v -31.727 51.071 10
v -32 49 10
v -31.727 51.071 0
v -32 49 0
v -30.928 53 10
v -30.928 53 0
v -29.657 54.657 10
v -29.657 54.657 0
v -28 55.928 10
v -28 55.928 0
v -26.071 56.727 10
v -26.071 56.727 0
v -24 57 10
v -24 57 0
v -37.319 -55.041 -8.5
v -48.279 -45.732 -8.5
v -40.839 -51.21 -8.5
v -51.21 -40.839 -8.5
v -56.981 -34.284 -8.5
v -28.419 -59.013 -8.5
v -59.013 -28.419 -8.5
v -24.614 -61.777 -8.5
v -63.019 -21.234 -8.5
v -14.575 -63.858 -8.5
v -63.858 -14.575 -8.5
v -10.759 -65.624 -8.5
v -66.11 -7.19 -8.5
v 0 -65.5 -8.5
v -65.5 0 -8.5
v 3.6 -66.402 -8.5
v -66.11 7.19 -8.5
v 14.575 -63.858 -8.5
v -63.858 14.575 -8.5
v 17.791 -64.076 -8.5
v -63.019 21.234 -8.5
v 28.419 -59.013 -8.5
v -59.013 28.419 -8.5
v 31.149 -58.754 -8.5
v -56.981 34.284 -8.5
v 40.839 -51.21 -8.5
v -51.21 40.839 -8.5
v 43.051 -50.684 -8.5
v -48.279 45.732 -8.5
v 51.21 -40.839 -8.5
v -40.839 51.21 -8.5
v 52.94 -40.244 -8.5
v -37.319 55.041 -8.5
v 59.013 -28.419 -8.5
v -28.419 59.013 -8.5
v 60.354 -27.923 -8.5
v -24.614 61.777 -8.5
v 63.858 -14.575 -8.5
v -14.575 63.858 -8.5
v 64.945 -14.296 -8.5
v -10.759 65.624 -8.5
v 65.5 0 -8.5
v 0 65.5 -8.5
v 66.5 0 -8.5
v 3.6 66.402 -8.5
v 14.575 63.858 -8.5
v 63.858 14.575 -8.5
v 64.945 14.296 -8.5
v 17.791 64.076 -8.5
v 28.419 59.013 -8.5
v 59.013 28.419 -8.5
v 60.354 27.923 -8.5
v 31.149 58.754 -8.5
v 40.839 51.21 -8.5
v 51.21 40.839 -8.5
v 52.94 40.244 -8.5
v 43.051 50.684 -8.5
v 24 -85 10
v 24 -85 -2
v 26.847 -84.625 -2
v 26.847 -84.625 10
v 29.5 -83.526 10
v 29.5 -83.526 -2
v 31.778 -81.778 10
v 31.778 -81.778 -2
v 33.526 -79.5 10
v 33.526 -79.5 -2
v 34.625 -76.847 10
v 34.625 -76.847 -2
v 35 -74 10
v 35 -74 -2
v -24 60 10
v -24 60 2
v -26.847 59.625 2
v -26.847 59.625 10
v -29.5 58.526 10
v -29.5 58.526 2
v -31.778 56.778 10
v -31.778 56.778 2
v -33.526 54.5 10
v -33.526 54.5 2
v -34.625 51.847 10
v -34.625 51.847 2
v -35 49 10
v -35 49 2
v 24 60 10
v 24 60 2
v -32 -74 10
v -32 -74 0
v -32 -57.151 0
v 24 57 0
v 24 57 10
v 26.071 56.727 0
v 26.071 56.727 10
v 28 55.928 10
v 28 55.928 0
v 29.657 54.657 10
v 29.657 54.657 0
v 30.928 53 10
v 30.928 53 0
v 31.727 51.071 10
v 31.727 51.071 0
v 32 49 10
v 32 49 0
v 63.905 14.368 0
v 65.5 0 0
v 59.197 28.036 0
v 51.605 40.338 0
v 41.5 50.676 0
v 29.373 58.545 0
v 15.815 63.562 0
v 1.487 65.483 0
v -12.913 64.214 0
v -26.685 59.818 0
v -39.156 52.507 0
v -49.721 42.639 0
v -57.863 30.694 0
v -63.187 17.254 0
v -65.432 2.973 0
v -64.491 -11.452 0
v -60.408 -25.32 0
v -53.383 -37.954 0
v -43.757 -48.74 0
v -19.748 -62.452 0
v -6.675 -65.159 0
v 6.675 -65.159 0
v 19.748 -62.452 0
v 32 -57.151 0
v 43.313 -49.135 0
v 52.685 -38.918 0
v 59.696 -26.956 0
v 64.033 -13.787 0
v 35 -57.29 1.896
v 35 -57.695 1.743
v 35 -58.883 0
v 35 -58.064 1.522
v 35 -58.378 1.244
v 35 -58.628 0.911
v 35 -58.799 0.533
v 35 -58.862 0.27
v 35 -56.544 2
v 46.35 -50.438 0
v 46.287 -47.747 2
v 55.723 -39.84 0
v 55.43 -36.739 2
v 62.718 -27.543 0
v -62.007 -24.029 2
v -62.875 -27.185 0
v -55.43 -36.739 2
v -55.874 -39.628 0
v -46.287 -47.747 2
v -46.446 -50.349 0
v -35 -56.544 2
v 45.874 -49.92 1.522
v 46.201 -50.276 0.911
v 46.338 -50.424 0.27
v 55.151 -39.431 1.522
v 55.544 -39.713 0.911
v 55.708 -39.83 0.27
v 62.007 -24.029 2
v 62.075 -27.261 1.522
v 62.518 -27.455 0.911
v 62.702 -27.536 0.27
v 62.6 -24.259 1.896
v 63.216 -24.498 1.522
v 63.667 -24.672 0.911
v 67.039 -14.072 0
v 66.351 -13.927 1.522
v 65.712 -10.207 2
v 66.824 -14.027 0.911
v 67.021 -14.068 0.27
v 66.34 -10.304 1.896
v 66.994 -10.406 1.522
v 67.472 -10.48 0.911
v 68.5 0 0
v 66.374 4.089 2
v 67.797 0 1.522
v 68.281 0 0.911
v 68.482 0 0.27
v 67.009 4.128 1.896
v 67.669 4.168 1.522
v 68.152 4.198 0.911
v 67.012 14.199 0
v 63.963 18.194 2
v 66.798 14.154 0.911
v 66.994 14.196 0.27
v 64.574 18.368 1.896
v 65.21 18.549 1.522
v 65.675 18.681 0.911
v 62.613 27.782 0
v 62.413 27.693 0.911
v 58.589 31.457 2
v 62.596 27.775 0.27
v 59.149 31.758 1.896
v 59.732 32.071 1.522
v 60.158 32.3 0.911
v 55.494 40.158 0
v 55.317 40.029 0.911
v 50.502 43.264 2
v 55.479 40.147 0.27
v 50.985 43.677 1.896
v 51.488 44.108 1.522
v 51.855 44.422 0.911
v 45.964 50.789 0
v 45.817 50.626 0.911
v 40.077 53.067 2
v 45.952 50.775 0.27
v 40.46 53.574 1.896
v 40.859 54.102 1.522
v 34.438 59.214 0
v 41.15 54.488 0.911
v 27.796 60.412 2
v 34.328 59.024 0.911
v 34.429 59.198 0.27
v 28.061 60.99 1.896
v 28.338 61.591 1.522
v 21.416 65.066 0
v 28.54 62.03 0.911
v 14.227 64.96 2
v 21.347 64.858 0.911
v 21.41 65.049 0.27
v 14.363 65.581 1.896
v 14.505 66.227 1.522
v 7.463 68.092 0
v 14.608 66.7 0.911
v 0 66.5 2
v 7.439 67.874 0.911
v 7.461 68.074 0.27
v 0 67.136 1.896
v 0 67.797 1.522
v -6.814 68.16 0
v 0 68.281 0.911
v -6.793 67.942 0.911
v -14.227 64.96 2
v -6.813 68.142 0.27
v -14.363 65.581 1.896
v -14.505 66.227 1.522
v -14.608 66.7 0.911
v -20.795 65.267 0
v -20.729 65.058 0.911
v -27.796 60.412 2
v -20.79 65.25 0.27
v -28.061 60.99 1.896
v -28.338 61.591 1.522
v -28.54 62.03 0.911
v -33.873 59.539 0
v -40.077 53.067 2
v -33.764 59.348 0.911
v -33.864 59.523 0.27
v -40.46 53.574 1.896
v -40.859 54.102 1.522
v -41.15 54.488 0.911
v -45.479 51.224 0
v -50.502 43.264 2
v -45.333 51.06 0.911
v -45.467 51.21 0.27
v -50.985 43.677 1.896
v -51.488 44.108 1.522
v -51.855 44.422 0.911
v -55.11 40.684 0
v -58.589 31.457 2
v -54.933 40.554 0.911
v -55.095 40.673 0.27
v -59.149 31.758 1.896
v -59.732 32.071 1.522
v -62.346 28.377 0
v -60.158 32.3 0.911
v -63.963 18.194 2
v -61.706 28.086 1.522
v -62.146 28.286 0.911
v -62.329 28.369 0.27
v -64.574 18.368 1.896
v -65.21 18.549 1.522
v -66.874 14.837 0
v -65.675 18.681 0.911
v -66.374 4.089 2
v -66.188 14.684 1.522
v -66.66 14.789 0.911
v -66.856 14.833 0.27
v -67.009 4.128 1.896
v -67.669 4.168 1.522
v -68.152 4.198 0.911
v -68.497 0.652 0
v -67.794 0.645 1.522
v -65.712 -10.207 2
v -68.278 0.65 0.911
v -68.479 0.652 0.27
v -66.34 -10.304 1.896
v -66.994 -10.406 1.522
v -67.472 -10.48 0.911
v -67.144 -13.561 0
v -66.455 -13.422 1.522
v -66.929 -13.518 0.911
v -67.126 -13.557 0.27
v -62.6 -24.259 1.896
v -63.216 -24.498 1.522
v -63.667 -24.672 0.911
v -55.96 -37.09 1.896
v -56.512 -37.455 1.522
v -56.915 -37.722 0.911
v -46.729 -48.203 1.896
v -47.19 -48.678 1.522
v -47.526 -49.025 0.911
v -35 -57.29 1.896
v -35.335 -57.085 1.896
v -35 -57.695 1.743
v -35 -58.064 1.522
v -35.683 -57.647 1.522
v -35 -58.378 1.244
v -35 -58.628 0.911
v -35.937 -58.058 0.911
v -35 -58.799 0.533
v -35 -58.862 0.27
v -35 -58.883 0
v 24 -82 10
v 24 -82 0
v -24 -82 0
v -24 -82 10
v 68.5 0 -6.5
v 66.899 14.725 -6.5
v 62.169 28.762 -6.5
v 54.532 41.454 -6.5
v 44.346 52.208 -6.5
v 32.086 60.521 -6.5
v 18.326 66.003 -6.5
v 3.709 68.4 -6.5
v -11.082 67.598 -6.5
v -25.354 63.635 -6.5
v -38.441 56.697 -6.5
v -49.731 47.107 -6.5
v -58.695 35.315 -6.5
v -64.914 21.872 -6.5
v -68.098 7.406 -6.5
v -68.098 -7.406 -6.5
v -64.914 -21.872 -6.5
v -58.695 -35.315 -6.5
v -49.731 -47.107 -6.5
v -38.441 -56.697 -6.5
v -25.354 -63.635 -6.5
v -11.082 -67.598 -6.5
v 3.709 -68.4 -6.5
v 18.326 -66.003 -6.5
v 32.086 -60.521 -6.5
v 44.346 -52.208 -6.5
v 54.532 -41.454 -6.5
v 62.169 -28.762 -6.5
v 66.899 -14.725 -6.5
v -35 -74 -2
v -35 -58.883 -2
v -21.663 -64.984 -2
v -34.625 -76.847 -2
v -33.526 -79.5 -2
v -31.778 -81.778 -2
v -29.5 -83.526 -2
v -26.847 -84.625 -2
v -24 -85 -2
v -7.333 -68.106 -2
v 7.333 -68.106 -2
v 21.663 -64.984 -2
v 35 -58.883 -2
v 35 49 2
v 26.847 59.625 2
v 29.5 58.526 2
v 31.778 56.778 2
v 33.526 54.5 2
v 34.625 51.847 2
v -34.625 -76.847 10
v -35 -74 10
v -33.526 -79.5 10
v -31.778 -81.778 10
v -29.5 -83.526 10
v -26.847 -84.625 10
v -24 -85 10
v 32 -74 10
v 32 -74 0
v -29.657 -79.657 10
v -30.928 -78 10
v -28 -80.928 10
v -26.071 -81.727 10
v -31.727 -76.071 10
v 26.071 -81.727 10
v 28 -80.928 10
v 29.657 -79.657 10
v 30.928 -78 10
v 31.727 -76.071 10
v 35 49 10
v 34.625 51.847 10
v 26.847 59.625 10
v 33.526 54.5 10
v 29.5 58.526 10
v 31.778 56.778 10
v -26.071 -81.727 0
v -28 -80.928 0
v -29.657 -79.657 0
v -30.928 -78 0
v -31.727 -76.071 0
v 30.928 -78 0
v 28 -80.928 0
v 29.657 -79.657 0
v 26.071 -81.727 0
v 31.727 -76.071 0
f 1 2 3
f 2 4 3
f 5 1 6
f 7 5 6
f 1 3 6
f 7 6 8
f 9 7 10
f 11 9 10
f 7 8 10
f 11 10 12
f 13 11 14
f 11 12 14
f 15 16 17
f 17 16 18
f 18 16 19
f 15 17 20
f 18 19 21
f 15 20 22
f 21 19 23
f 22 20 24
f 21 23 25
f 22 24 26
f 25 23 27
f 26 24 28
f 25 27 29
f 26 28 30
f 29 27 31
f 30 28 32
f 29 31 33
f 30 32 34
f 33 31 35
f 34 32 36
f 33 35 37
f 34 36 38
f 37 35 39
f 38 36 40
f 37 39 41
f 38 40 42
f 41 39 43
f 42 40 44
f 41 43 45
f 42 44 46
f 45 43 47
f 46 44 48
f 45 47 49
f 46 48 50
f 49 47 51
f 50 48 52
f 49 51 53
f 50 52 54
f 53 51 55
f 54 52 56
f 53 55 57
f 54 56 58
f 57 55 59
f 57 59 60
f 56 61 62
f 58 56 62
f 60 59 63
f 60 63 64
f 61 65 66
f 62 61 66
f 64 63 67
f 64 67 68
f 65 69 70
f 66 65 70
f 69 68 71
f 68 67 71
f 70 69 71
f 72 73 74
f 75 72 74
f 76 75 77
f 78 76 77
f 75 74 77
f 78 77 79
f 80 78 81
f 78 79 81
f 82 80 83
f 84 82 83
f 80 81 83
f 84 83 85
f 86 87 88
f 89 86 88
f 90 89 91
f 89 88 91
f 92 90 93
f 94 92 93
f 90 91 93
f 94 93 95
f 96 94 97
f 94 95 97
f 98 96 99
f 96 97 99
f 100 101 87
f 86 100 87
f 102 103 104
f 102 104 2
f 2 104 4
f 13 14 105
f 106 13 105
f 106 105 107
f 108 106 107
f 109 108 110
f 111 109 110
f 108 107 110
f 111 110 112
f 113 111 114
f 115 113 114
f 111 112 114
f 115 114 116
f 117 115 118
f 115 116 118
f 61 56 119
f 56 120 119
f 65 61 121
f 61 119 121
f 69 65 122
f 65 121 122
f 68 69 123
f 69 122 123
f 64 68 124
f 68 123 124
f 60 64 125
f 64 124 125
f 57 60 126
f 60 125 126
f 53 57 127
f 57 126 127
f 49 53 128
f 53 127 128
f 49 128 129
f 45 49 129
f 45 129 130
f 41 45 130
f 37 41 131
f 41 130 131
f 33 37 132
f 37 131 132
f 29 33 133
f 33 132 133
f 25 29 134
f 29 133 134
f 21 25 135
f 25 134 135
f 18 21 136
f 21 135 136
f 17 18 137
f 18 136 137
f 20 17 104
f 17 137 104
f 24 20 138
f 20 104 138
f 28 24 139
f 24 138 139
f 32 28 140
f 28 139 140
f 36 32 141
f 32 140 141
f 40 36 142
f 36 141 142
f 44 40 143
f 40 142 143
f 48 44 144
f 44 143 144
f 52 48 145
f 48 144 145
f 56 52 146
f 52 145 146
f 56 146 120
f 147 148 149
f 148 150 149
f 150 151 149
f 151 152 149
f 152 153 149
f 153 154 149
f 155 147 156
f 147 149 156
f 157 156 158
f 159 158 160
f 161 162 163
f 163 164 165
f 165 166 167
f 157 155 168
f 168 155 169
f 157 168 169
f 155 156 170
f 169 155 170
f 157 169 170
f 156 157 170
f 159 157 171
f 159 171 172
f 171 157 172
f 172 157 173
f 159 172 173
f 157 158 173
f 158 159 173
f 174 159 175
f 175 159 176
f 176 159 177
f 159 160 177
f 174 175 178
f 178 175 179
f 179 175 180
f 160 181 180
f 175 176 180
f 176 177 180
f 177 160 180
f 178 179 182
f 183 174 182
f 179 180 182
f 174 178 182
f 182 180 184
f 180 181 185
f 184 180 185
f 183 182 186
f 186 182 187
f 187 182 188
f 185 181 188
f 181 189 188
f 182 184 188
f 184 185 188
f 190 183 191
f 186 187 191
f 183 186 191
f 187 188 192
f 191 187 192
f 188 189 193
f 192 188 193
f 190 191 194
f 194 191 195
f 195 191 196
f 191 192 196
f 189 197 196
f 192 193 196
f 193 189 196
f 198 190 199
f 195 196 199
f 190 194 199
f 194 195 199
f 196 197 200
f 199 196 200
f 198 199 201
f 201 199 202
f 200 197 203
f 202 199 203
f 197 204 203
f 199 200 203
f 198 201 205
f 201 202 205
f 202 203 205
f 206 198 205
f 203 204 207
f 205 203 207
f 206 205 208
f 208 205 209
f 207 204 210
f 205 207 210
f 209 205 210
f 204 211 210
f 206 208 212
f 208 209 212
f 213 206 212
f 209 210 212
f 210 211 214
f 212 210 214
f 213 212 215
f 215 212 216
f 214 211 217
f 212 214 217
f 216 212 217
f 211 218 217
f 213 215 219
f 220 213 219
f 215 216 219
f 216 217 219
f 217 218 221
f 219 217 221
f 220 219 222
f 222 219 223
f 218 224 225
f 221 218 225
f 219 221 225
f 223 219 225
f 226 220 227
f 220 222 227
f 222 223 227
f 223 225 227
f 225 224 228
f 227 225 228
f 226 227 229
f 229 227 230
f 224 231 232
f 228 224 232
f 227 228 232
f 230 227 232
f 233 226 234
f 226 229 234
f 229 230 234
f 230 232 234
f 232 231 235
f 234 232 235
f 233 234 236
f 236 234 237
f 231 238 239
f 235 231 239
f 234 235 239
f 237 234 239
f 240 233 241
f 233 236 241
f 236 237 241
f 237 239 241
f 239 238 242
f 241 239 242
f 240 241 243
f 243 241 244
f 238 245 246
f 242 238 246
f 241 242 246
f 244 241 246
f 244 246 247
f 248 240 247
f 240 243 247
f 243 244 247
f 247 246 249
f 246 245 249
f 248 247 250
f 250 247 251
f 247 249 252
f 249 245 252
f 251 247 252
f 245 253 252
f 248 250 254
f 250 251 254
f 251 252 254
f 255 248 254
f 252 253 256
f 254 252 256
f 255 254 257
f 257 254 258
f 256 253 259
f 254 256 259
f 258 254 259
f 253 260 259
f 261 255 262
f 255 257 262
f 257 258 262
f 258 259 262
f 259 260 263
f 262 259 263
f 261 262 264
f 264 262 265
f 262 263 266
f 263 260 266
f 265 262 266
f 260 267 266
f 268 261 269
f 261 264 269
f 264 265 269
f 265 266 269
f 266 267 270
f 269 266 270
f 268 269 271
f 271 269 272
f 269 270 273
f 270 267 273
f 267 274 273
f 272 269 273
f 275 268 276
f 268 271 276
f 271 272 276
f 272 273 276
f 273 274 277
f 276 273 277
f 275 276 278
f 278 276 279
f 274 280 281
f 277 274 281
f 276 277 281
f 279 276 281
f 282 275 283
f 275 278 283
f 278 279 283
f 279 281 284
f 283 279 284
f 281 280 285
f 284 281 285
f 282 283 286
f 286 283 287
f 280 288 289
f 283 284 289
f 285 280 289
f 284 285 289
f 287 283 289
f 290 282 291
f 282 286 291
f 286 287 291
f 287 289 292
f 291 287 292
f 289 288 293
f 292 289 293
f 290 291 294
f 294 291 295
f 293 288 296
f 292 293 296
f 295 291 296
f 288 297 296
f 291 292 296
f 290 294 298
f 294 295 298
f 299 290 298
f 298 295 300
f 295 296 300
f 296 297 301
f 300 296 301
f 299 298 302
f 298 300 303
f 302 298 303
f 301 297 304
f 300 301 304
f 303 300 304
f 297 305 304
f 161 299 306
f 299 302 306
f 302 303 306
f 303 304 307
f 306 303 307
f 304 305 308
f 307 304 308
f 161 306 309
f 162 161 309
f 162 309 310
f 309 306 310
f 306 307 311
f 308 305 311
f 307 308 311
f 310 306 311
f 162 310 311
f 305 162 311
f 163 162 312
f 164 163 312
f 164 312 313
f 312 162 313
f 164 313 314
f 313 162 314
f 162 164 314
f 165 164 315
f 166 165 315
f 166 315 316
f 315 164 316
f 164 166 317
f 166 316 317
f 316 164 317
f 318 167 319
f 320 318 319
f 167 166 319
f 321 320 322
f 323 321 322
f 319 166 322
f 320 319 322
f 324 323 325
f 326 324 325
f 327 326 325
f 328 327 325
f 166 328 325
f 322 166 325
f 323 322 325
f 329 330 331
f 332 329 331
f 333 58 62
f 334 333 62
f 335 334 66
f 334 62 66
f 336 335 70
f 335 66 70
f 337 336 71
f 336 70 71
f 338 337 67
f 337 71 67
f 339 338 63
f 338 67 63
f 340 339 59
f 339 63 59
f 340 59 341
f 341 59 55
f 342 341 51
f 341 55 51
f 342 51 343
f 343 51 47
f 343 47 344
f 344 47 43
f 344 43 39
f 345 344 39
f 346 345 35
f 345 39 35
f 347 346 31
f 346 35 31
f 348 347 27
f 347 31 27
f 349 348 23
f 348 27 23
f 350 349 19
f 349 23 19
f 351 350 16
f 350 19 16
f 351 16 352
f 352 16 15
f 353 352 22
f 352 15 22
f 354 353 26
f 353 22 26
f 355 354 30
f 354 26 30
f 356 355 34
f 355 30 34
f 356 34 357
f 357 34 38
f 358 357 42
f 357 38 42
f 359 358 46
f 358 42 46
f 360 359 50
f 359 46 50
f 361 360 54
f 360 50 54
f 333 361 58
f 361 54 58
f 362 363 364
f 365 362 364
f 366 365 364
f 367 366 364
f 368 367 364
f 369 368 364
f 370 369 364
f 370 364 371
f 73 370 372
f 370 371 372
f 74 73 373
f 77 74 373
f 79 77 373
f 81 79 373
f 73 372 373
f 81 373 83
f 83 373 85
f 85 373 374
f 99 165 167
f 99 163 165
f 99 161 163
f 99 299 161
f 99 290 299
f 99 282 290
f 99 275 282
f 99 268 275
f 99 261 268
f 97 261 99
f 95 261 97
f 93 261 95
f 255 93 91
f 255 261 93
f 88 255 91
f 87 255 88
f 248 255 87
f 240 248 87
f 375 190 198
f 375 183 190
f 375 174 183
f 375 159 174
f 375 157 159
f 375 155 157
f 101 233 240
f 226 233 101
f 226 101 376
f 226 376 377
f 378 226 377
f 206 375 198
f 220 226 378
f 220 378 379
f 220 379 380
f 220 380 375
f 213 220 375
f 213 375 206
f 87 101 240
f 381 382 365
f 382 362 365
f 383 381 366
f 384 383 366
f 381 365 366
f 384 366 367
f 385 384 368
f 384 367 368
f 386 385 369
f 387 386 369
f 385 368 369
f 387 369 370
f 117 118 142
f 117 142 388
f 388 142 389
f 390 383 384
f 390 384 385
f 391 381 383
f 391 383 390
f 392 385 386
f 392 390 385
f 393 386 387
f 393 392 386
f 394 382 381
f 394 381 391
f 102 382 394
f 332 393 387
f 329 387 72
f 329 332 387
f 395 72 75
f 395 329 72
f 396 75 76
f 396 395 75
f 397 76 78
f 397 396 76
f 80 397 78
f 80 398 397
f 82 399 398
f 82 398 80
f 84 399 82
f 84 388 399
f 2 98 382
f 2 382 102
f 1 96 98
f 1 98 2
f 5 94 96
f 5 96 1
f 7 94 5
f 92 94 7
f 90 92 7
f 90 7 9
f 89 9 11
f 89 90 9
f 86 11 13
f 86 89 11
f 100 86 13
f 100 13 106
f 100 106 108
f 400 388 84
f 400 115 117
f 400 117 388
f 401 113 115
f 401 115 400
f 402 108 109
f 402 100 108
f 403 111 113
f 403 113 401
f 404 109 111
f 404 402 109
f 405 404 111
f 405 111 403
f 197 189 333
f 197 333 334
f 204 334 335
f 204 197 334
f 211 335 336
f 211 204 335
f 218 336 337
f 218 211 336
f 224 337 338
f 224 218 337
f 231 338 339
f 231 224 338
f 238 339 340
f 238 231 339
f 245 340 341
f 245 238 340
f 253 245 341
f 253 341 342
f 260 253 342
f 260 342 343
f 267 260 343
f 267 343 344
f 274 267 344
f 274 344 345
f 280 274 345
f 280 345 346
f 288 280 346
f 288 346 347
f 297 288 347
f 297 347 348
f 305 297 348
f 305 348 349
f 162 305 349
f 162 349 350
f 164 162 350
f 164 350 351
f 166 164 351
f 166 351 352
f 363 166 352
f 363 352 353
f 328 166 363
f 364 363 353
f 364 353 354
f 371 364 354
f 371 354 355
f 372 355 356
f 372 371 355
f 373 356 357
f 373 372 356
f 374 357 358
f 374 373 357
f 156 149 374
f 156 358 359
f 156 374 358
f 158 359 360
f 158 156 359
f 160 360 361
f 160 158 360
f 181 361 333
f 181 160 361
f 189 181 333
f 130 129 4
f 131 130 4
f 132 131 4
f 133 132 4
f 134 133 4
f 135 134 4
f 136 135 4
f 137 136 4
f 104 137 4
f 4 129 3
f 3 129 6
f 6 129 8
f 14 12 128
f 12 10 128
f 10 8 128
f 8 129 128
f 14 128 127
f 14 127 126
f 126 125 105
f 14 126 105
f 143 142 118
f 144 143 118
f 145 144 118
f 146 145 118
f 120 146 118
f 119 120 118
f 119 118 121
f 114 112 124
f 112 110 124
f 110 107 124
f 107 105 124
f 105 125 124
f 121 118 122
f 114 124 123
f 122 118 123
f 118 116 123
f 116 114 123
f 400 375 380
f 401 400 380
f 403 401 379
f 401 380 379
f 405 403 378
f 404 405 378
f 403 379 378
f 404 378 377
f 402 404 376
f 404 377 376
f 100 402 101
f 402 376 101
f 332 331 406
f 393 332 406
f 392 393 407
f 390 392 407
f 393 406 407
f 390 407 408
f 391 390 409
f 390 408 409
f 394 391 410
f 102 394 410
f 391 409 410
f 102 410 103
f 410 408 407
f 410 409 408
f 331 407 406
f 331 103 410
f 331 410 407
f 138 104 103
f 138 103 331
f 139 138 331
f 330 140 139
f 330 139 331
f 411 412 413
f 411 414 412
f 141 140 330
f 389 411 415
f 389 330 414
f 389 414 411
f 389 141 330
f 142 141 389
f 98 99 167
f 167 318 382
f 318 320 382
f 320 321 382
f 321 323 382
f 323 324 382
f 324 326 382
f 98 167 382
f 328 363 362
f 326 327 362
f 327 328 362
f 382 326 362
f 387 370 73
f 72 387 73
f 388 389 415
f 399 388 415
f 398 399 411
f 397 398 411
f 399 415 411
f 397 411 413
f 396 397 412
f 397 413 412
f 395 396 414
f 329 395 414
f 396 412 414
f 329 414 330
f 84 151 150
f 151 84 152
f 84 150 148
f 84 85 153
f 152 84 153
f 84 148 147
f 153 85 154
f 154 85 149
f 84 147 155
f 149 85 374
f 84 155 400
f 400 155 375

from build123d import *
from build123d import SkipClean  # not in build123d's __all__

# Parameters (mm, degrees)
F0_R     = 68.5
F0_R_2   = 65.5
F1_DEPTH = 2
F2_DEPTH = 8.5
F3_SIZE  = 2
F5_DEPTH = 2
F6_DEPTH = 3
F7_DEPTH = 10
F8_DEPTH = 25
F9_R     = 2


# Not quite as in the source:
# - after a boolean that leaves OpenCascade's solid faulty, fix() repairs it


with BuildPart() as f1:
    # F0 (on Top) → F1 (new body)
    with BuildSketch(Plane.XY):
        Circle(F0_R)
        Circle(F0_R_2, mode=Mode.SUBTRACT)
        Circle(F0_R_2)
    extrude(amount=F1_DEPTH)

    # F0 (on Top) → F2 (join)
    with BuildSketch(Plane.XY):
        Circle(F0_R)
        Circle(F0_R_2, mode=Mode.SUBTRACT)
    extrude(amount=-F2_DEPTH)

    # F3
    f3_edges = [f1.edges().sort_by_distance(p)[0] for p in [
        (-68.5, 0, -8.5),
    ]]
    chamfer(f3_edges, length=F3_SIZE)

    # F4 (on Top) → F5 (join)
    with BuildSketch(Plane.XY):
        with BuildLine():
            Line((35, -74), (35, 49))
            ThreePointArc((35, 49), (31.7781745931, 56.7781745931), (24, 60))
            Line((24, 60), (-24, 60))
            ThreePointArc((-24, 60), (-31.7781745931, 56.7781745931), (-35, 49))
            Line((-35, 49), (-35, -74))
            ThreePointArc((-35, -74), (-31.7781745931, -81.7781745931), (-24, -85))
            Line((-24, -85), (24, -85))
            ThreePointArc((24, -85), (31.7781745931, -81.7781745931), (35, -74))
        make_face()
        with BuildLine():
            ThreePointArc((-32, 49), (-29.6568542495, 54.6568542495), (-24, 57))
            Line((-24, 57), (0, 57))
            Line((0, 57), (24, 57))
            ThreePointArc((24, 57), (29.6568542495, 54.6568542495), (32, 49))
            Line((32, 49), (32, -74))
            ThreePointArc((32, -74), (29.6568542495, -79.6568542495), (24, -82))
            Line((24, -82), (-24, -82))
            ThreePointArc((-24, -82), (-29.6568542495, -79.6568542495), (-32, -74))
            Line((-32, -74), (-32, 49))
        make_face(mode=Mode.SUBTRACT)
        with BuildLine():
            Line((0, 57), (-24, 57))
            ThreePointArc((-24, 57), (-29.6568542495, 54.6568542495), (-32, 49))
            Line((-32, 49), (-32, -74))
            ThreePointArc((-32, -74), (-29.6568542495, -79.6568542495), (-24, -82))
            Line((-24, -82), (24, -82))
            ThreePointArc((24, -82), (29.6568542495, -79.6568542495), (32, -74))
            Line((32, -74), (32, 49))
            ThreePointArc((32, 49), (29.6568542495, 54.6568542495), (24, 57))
            Line((24, 57), (0, 57))
        make_face()
    extrude(amount=-F5_DEPTH)

    # F4 (on Top) → F6 (cut)
    with BuildSketch(Plane.XY):
        with BuildLine():
            Line((0, 57), (-24, 57))
            ThreePointArc((-24, 57), (-29.6568542495, 54.6568542495), (-32, 49))
            Line((-32, 49), (-32, -74))
            ThreePointArc((-32, -74), (-29.6568542495, -79.6568542495), (-24, -82))
            Line((-24, -82), (24, -82))
            ThreePointArc((24, -82), (29.6568542495, -79.6568542495), (32, -74))
            Line((32, -74), (32, 49))
            ThreePointArc((32, 49), (29.6568542495, 54.6568542495), (24, 57))
            Line((24, 57), (0, 57))
        make_face()
    extrude(amount=F6_DEPTH, mode=Mode.SUBTRACT)

    # F4 (on Top) → F7 (join)
    with BuildSketch(Plane.XY):
        with BuildLine():
            Line((35, -74), (35, 49))
            ThreePointArc((35, 49), (31.7781745931, 56.7781745931), (24, 60))
            Line((24, 60), (-24, 60))
            ThreePointArc((-24, 60), (-31.7781745931, 56.7781745931), (-35, 49))
            Line((-35, 49), (-35, -74))
            ThreePointArc((-35, -74), (-31.7781745931, -81.7781745931), (-24, -85))
            Line((-24, -85), (24, -85))
            ThreePointArc((24, -85), (31.7781745931, -81.7781745931), (35, -74))
        make_face()
        with BuildLine():
            ThreePointArc((-32, 49), (-29.6568542495, 54.6568542495), (-24, 57))
            Line((-24, 57), (0, 57))
            Line((0, 57), (24, 57))
            ThreePointArc((24, 57), (29.6568542495, 54.6568542495), (32, 49))
            Line((32, 49), (32, -74))
            ThreePointArc((32, -74), (29.6568542495, -79.6568542495), (24, -82))
            Line((24, -82), (-24, -82))
            ThreePointArc((-24, -82), (-29.6568542495, -79.6568542495), (-32, -74))
            Line((-32, -74), (-32, 49))
        make_face(mode=Mode.SUBTRACT)
    with SkipClean():  # cleaning this boolean's faces spoils the solid; the shape is the same uncleaned
        extrude(amount=F7_DEPTH)

    # F0 (on Top) → F8 (cut)
    with BuildSketch(Plane.XY):
        Circle(F0_R_2)
    extrude(amount=-F8_DEPTH, mode=Mode.SUBTRACT)

    add(f1.part.fix(), mode=Mode.REPLACE)

    # F9
    f9_edges = [f1.edges().sort_by_distance(p)[0] for p in [
        (-33.872924, 59.538853, 2),
    ]]
    fillet(f9_edges, radius=F9_R)


solid = f1.part
